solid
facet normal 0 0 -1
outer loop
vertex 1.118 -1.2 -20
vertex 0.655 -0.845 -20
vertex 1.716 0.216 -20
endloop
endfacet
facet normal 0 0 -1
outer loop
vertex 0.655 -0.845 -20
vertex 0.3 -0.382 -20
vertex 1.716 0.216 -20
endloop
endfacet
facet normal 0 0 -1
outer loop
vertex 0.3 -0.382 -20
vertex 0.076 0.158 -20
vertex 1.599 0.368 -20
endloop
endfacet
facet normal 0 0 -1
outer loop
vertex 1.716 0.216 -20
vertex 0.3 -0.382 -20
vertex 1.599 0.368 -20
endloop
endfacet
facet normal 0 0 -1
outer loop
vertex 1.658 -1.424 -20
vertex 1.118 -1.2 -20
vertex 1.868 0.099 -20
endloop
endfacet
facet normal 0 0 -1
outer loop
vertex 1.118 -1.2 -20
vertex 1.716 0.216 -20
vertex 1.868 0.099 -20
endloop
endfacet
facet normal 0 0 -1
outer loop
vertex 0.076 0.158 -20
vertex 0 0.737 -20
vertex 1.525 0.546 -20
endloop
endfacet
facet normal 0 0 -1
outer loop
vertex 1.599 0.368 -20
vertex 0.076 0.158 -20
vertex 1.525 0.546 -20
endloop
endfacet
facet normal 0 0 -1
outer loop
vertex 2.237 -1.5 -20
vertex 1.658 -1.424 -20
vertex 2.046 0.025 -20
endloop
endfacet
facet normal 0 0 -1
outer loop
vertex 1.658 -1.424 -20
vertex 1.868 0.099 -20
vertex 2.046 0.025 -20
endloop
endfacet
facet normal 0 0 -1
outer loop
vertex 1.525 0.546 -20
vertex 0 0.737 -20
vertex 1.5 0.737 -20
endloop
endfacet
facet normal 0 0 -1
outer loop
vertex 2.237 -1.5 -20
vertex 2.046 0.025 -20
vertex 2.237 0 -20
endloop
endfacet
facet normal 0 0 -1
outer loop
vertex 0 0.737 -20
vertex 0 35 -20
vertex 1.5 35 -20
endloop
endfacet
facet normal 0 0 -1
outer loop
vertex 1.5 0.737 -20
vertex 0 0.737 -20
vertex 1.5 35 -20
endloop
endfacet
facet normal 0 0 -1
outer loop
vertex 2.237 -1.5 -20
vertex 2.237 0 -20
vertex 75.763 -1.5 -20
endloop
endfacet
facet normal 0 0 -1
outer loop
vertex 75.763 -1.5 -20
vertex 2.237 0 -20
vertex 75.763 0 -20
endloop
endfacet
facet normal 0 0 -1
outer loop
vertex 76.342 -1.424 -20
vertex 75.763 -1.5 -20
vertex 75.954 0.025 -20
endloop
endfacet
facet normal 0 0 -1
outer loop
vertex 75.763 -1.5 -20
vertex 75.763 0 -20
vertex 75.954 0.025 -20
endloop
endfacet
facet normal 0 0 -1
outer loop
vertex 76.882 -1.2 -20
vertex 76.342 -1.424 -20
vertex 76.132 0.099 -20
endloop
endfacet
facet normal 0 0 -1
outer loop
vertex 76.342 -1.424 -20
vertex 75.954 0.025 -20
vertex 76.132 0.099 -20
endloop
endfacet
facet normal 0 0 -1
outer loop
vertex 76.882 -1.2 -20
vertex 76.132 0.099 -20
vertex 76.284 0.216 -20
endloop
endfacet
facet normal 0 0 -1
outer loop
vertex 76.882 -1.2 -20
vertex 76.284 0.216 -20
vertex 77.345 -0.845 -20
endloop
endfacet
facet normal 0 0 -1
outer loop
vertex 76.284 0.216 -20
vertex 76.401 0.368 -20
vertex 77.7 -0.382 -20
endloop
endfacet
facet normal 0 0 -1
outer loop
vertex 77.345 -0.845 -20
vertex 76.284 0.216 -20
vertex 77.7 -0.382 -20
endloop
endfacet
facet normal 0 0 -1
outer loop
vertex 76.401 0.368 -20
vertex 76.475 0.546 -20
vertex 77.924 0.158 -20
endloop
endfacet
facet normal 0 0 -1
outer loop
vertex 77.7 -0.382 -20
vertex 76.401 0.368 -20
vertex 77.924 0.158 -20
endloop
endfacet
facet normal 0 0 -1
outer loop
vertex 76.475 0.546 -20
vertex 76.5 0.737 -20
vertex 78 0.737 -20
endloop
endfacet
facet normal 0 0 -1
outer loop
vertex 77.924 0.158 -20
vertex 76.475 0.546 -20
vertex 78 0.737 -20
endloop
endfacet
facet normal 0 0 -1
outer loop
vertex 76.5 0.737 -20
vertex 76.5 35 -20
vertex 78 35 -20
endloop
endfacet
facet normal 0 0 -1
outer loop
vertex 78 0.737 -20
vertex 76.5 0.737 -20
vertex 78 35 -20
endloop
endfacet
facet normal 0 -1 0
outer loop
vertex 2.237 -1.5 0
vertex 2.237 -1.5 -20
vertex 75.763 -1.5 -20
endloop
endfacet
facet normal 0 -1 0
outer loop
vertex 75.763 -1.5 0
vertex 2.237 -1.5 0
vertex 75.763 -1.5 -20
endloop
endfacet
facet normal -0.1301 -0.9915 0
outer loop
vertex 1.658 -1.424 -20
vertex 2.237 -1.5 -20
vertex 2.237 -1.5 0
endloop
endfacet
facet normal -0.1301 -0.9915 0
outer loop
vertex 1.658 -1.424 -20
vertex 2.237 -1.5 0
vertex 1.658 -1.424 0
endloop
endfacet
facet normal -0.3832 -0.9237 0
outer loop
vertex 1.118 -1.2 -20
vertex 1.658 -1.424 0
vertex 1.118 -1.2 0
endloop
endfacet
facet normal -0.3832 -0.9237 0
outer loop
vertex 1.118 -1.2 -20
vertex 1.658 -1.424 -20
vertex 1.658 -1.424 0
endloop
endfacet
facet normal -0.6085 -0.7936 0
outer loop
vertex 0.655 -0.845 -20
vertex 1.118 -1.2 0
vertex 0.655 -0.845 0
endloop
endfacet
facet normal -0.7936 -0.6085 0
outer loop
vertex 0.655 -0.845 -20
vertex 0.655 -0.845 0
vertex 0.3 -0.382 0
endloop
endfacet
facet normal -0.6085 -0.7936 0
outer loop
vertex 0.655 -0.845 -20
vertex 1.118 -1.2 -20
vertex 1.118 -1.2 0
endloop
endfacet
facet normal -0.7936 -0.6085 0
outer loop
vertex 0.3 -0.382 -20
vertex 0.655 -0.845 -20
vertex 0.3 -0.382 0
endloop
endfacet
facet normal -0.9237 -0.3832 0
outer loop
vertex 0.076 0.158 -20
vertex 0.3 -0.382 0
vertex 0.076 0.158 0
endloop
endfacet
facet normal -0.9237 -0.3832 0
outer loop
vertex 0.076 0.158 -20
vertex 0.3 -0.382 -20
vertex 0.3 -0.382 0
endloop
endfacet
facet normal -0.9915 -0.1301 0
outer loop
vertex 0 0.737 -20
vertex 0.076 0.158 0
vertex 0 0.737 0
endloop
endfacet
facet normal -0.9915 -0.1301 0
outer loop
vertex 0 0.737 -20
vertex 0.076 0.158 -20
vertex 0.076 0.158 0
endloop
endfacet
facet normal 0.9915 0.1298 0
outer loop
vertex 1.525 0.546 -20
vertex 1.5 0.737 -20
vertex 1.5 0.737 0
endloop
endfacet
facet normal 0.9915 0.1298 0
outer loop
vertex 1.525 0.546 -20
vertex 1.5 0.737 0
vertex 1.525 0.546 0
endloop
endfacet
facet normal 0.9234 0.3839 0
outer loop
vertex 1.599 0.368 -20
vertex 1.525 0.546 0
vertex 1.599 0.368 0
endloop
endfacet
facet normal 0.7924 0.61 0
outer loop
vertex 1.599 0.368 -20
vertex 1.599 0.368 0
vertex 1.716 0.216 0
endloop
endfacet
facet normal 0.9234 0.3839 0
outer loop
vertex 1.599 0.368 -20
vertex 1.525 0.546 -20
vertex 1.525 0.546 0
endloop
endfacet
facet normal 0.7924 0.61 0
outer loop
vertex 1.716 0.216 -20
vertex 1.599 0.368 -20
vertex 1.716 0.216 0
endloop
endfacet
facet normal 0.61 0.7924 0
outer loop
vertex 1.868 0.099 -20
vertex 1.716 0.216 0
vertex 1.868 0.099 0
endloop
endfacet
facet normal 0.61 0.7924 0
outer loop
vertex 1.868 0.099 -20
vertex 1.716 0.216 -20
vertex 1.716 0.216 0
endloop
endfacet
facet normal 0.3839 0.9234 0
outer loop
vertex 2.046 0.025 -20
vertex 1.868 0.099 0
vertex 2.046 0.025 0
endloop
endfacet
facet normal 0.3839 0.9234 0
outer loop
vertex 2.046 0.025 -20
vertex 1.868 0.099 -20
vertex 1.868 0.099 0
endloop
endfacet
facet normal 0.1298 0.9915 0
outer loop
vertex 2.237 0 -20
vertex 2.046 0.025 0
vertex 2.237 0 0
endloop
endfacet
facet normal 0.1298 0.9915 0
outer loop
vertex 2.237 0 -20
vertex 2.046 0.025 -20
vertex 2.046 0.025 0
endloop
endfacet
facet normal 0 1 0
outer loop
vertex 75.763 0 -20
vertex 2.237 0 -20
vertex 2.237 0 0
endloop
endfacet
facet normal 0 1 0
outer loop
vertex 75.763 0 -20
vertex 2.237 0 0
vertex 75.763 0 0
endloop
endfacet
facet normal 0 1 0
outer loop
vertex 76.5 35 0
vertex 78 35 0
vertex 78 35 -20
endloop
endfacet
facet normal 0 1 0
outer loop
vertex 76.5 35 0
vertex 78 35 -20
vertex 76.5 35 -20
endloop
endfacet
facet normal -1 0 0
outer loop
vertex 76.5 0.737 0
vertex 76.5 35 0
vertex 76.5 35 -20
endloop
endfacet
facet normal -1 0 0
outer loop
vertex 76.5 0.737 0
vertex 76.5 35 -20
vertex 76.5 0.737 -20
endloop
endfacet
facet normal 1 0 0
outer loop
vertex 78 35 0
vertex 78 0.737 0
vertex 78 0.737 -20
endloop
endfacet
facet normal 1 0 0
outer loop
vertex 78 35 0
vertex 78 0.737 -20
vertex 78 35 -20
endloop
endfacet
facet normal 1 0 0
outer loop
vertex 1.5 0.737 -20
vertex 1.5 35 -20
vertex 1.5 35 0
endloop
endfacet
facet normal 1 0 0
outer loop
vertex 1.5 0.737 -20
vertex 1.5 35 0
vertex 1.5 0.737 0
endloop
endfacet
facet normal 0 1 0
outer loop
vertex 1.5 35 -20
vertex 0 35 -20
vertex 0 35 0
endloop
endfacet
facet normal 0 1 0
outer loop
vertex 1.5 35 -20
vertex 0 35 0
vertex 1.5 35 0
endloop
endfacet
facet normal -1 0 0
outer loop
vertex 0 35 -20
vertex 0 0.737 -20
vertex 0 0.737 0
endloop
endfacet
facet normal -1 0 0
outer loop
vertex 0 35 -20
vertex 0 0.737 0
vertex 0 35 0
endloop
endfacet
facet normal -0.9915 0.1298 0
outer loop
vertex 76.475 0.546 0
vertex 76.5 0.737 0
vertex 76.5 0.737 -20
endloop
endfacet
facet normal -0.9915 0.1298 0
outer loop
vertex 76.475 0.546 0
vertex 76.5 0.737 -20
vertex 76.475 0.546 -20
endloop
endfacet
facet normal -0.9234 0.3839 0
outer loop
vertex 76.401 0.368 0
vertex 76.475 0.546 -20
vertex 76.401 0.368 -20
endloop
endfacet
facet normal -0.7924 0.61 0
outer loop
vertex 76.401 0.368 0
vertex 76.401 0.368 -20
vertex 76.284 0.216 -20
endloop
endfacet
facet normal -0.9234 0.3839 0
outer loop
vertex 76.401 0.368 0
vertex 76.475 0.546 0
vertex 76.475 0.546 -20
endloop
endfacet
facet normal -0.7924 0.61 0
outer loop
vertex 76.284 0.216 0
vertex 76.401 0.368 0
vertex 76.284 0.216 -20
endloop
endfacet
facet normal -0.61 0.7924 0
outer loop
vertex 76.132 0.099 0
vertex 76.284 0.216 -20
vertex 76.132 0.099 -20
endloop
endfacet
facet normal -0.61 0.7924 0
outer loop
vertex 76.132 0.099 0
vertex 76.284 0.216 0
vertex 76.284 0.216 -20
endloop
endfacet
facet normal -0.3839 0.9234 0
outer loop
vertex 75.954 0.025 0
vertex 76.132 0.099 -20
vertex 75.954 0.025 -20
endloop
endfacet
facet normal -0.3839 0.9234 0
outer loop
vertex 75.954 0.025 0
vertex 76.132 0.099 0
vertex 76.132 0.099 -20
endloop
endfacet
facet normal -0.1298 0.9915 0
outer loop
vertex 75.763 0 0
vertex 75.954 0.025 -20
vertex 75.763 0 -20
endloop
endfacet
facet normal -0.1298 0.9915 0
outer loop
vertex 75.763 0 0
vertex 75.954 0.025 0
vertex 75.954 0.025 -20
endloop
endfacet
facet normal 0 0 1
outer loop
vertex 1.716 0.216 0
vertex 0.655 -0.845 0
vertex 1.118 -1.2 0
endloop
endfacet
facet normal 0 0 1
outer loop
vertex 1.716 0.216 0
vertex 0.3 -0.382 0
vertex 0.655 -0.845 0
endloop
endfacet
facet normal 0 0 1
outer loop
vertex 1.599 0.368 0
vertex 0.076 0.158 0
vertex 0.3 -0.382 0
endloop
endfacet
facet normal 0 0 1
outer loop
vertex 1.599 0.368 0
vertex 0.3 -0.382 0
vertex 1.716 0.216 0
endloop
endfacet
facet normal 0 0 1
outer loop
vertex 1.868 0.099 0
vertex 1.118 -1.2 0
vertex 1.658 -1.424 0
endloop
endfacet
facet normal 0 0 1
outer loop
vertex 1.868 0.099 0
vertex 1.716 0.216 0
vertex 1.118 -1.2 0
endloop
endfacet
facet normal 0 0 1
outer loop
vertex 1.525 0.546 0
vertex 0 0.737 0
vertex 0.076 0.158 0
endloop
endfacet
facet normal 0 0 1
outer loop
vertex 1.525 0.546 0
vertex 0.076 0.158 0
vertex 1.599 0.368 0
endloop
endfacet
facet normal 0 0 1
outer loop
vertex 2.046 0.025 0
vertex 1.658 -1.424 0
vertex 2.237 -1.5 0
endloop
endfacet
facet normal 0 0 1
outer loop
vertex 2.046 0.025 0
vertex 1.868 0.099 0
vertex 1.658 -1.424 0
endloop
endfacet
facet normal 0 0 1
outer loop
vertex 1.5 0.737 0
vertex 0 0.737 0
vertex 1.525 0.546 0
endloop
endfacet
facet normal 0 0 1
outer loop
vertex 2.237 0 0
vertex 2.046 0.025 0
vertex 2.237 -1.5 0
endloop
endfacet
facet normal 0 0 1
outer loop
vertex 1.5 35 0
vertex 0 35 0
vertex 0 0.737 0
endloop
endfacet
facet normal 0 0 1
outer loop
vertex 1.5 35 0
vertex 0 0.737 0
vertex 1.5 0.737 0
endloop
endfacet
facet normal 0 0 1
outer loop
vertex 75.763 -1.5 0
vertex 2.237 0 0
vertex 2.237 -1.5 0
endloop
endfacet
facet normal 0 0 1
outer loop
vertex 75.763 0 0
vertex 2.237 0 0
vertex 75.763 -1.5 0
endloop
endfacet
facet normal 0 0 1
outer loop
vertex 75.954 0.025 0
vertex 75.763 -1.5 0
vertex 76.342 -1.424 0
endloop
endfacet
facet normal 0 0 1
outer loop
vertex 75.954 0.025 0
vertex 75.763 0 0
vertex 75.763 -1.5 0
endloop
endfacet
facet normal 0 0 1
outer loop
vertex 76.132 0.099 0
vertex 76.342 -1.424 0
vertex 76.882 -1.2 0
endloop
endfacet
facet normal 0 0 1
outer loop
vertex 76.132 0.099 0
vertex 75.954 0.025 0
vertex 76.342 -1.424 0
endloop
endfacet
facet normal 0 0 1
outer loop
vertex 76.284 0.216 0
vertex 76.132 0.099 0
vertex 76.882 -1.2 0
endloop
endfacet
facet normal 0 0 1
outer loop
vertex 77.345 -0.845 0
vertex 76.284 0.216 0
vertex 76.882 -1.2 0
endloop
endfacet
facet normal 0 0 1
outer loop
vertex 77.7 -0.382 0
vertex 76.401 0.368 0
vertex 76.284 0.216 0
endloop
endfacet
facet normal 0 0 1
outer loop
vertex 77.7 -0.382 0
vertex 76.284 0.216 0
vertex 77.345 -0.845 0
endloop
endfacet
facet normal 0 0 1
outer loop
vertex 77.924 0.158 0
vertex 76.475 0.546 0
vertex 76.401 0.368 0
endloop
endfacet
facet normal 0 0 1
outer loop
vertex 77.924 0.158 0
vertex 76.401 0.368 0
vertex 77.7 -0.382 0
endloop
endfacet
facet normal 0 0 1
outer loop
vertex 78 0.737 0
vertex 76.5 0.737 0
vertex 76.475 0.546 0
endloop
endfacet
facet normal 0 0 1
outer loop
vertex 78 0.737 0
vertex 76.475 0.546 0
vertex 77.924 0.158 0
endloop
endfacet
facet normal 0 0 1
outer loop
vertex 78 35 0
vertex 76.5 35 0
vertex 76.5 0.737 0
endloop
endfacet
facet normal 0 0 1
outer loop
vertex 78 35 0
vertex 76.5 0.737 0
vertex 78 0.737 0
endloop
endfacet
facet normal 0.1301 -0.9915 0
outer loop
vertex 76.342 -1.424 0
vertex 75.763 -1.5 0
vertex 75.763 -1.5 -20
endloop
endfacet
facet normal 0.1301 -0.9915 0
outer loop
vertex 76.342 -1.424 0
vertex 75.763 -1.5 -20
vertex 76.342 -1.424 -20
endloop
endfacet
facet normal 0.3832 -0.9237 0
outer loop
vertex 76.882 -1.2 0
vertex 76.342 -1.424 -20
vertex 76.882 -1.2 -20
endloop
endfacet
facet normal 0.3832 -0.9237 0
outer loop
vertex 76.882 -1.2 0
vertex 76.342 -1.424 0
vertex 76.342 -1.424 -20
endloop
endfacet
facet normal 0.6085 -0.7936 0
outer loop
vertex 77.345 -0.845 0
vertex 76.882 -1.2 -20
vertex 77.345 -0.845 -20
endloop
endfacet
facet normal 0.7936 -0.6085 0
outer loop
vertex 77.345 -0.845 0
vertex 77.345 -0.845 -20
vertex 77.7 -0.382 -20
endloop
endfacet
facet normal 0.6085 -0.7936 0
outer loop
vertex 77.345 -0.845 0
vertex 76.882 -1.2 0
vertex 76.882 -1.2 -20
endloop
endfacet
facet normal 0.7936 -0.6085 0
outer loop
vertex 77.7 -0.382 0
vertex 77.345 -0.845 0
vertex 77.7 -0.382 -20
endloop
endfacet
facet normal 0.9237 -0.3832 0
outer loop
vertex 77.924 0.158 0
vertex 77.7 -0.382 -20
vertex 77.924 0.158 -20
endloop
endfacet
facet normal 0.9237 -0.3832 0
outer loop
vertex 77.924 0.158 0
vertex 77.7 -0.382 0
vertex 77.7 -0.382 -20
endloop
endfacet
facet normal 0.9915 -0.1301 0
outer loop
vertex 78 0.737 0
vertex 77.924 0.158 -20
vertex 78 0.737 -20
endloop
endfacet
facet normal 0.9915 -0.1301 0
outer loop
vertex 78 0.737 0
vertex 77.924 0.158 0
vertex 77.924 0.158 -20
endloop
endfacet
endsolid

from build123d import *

# Parameters (mm, degrees)
SKETCH_1_W                       = 78
SKETCH_1_H                       = 20
SM_BASE_FLANGE_1_DEPTH           = 1.5
SM_EDGE_FLANGE_1_STRIP_W         = 7.4732
SM_EDGE_FLANGE_1_STRIP_H         = 1.5
SM_EDGE_FLANGE_1_STRIP_CUT_DEPTH = 20
SM_EDGE_FLANGE_1_DEPTH           = 20
SM_EDGE_FLANGE_2_STRIP_W         = 7.4732
SM_EDGE_FLANGE_2_STRIP_H         = 1.5
SM_EDGE_FLANGE_2_STRIP_CUT_DEPTH = 20
SM_EDGE_FLANGE_2_DEPTH           = 20


# Sheet-metal steps are written as plain solids
with BuildPart() as part:
    # Sketch 1 → Базовая кромка1 (new body)
    with BuildSketch(Plane(origin=(0, 0, 0), x_dir=(1, 0, 0), z_dir=(0, 1, 0))):
        with Locations((39, 10)):
            Rectangle(SKETCH_1_W, SKETCH_1_H)
    extrude(amount=-SM_BASE_FLANGE_1_DEPTH)

    # Ребро-кромка1 strip (across the edge) → Ребро-кромка1 strip cut (cut)
    with BuildSketch(Plane.XY.offset(-20)):
        with Locations((-1.5, -0.75)):
            Rectangle(SM_EDGE_FLANGE_1_STRIP_W, SM_EDGE_FLANGE_1_STRIP_H)
    extrude(amount=SM_EDGE_FLANGE_1_STRIP_CUT_DEPTH, mode=Mode.SUBTRACT)

    # Ребро-кромка1 section (across the edge) → Ребро-кромка1 (add)
    with BuildSketch(Plane.XY.offset(-20)):
        with BuildLine():
            Line((0, 0.7366), (0, 35))
            Line((0, 35), (1.5, 35))
            Line((1.5, 35), (1.5, 0.7366))
            ThreePointArc((1.5, 0.7366), (1.715745145, 0.215745145), (2.2366, 0))
            Line((2.2366, 0), (2.2366, -1.5))
            ThreePointArc((2.2366, -1.5), (0.655084973, -0.844915027), (0, 0.7366))
        make_face()
    extrude(amount=SM_EDGE_FLANGE_1_DEPTH)

    # Ребро-кромка2 strip (across the edge) → Ребро-кромка2 strip cut (cut)
    with BuildSketch(Plane(origin=(78, 0, 0), x_dir=(-1, 0, 0), z_dir=(0, 0, -1))):
        with Locations((-1.5, -0.75)):
            Rectangle(SM_EDGE_FLANGE_2_STRIP_W, SM_EDGE_FLANGE_2_STRIP_H)
    extrude(amount=SM_EDGE_FLANGE_2_STRIP_CUT_DEPTH, mode=Mode.SUBTRACT)

    # Ребро-кромка2 section (across the edge) → Ребро-кромка2 (add)
    with BuildSketch(Plane(origin=(78, 0, 0), x_dir=(-1, 0, 0), z_dir=(0, 0, -1))):
        with BuildLine():
            Line((0, 0.7366), (0, 35))
            Line((0, 35), (1.5, 35))
            Line((1.5, 35), (1.5, 0.7366))
            ThreePointArc((1.5, 0.7366), (1.715745145, 0.215745145), (2.2366, 0))
            Line((2.2366, 0), (2.2366, -1.5))
            ThreePointArc((2.2366, -1.5), (0.655084973, -0.844915027), (0, 0.7366))
        make_face()
    extrude(amount=SM_EDGE_FLANGE_2_DEPTH)


solid = part.part
